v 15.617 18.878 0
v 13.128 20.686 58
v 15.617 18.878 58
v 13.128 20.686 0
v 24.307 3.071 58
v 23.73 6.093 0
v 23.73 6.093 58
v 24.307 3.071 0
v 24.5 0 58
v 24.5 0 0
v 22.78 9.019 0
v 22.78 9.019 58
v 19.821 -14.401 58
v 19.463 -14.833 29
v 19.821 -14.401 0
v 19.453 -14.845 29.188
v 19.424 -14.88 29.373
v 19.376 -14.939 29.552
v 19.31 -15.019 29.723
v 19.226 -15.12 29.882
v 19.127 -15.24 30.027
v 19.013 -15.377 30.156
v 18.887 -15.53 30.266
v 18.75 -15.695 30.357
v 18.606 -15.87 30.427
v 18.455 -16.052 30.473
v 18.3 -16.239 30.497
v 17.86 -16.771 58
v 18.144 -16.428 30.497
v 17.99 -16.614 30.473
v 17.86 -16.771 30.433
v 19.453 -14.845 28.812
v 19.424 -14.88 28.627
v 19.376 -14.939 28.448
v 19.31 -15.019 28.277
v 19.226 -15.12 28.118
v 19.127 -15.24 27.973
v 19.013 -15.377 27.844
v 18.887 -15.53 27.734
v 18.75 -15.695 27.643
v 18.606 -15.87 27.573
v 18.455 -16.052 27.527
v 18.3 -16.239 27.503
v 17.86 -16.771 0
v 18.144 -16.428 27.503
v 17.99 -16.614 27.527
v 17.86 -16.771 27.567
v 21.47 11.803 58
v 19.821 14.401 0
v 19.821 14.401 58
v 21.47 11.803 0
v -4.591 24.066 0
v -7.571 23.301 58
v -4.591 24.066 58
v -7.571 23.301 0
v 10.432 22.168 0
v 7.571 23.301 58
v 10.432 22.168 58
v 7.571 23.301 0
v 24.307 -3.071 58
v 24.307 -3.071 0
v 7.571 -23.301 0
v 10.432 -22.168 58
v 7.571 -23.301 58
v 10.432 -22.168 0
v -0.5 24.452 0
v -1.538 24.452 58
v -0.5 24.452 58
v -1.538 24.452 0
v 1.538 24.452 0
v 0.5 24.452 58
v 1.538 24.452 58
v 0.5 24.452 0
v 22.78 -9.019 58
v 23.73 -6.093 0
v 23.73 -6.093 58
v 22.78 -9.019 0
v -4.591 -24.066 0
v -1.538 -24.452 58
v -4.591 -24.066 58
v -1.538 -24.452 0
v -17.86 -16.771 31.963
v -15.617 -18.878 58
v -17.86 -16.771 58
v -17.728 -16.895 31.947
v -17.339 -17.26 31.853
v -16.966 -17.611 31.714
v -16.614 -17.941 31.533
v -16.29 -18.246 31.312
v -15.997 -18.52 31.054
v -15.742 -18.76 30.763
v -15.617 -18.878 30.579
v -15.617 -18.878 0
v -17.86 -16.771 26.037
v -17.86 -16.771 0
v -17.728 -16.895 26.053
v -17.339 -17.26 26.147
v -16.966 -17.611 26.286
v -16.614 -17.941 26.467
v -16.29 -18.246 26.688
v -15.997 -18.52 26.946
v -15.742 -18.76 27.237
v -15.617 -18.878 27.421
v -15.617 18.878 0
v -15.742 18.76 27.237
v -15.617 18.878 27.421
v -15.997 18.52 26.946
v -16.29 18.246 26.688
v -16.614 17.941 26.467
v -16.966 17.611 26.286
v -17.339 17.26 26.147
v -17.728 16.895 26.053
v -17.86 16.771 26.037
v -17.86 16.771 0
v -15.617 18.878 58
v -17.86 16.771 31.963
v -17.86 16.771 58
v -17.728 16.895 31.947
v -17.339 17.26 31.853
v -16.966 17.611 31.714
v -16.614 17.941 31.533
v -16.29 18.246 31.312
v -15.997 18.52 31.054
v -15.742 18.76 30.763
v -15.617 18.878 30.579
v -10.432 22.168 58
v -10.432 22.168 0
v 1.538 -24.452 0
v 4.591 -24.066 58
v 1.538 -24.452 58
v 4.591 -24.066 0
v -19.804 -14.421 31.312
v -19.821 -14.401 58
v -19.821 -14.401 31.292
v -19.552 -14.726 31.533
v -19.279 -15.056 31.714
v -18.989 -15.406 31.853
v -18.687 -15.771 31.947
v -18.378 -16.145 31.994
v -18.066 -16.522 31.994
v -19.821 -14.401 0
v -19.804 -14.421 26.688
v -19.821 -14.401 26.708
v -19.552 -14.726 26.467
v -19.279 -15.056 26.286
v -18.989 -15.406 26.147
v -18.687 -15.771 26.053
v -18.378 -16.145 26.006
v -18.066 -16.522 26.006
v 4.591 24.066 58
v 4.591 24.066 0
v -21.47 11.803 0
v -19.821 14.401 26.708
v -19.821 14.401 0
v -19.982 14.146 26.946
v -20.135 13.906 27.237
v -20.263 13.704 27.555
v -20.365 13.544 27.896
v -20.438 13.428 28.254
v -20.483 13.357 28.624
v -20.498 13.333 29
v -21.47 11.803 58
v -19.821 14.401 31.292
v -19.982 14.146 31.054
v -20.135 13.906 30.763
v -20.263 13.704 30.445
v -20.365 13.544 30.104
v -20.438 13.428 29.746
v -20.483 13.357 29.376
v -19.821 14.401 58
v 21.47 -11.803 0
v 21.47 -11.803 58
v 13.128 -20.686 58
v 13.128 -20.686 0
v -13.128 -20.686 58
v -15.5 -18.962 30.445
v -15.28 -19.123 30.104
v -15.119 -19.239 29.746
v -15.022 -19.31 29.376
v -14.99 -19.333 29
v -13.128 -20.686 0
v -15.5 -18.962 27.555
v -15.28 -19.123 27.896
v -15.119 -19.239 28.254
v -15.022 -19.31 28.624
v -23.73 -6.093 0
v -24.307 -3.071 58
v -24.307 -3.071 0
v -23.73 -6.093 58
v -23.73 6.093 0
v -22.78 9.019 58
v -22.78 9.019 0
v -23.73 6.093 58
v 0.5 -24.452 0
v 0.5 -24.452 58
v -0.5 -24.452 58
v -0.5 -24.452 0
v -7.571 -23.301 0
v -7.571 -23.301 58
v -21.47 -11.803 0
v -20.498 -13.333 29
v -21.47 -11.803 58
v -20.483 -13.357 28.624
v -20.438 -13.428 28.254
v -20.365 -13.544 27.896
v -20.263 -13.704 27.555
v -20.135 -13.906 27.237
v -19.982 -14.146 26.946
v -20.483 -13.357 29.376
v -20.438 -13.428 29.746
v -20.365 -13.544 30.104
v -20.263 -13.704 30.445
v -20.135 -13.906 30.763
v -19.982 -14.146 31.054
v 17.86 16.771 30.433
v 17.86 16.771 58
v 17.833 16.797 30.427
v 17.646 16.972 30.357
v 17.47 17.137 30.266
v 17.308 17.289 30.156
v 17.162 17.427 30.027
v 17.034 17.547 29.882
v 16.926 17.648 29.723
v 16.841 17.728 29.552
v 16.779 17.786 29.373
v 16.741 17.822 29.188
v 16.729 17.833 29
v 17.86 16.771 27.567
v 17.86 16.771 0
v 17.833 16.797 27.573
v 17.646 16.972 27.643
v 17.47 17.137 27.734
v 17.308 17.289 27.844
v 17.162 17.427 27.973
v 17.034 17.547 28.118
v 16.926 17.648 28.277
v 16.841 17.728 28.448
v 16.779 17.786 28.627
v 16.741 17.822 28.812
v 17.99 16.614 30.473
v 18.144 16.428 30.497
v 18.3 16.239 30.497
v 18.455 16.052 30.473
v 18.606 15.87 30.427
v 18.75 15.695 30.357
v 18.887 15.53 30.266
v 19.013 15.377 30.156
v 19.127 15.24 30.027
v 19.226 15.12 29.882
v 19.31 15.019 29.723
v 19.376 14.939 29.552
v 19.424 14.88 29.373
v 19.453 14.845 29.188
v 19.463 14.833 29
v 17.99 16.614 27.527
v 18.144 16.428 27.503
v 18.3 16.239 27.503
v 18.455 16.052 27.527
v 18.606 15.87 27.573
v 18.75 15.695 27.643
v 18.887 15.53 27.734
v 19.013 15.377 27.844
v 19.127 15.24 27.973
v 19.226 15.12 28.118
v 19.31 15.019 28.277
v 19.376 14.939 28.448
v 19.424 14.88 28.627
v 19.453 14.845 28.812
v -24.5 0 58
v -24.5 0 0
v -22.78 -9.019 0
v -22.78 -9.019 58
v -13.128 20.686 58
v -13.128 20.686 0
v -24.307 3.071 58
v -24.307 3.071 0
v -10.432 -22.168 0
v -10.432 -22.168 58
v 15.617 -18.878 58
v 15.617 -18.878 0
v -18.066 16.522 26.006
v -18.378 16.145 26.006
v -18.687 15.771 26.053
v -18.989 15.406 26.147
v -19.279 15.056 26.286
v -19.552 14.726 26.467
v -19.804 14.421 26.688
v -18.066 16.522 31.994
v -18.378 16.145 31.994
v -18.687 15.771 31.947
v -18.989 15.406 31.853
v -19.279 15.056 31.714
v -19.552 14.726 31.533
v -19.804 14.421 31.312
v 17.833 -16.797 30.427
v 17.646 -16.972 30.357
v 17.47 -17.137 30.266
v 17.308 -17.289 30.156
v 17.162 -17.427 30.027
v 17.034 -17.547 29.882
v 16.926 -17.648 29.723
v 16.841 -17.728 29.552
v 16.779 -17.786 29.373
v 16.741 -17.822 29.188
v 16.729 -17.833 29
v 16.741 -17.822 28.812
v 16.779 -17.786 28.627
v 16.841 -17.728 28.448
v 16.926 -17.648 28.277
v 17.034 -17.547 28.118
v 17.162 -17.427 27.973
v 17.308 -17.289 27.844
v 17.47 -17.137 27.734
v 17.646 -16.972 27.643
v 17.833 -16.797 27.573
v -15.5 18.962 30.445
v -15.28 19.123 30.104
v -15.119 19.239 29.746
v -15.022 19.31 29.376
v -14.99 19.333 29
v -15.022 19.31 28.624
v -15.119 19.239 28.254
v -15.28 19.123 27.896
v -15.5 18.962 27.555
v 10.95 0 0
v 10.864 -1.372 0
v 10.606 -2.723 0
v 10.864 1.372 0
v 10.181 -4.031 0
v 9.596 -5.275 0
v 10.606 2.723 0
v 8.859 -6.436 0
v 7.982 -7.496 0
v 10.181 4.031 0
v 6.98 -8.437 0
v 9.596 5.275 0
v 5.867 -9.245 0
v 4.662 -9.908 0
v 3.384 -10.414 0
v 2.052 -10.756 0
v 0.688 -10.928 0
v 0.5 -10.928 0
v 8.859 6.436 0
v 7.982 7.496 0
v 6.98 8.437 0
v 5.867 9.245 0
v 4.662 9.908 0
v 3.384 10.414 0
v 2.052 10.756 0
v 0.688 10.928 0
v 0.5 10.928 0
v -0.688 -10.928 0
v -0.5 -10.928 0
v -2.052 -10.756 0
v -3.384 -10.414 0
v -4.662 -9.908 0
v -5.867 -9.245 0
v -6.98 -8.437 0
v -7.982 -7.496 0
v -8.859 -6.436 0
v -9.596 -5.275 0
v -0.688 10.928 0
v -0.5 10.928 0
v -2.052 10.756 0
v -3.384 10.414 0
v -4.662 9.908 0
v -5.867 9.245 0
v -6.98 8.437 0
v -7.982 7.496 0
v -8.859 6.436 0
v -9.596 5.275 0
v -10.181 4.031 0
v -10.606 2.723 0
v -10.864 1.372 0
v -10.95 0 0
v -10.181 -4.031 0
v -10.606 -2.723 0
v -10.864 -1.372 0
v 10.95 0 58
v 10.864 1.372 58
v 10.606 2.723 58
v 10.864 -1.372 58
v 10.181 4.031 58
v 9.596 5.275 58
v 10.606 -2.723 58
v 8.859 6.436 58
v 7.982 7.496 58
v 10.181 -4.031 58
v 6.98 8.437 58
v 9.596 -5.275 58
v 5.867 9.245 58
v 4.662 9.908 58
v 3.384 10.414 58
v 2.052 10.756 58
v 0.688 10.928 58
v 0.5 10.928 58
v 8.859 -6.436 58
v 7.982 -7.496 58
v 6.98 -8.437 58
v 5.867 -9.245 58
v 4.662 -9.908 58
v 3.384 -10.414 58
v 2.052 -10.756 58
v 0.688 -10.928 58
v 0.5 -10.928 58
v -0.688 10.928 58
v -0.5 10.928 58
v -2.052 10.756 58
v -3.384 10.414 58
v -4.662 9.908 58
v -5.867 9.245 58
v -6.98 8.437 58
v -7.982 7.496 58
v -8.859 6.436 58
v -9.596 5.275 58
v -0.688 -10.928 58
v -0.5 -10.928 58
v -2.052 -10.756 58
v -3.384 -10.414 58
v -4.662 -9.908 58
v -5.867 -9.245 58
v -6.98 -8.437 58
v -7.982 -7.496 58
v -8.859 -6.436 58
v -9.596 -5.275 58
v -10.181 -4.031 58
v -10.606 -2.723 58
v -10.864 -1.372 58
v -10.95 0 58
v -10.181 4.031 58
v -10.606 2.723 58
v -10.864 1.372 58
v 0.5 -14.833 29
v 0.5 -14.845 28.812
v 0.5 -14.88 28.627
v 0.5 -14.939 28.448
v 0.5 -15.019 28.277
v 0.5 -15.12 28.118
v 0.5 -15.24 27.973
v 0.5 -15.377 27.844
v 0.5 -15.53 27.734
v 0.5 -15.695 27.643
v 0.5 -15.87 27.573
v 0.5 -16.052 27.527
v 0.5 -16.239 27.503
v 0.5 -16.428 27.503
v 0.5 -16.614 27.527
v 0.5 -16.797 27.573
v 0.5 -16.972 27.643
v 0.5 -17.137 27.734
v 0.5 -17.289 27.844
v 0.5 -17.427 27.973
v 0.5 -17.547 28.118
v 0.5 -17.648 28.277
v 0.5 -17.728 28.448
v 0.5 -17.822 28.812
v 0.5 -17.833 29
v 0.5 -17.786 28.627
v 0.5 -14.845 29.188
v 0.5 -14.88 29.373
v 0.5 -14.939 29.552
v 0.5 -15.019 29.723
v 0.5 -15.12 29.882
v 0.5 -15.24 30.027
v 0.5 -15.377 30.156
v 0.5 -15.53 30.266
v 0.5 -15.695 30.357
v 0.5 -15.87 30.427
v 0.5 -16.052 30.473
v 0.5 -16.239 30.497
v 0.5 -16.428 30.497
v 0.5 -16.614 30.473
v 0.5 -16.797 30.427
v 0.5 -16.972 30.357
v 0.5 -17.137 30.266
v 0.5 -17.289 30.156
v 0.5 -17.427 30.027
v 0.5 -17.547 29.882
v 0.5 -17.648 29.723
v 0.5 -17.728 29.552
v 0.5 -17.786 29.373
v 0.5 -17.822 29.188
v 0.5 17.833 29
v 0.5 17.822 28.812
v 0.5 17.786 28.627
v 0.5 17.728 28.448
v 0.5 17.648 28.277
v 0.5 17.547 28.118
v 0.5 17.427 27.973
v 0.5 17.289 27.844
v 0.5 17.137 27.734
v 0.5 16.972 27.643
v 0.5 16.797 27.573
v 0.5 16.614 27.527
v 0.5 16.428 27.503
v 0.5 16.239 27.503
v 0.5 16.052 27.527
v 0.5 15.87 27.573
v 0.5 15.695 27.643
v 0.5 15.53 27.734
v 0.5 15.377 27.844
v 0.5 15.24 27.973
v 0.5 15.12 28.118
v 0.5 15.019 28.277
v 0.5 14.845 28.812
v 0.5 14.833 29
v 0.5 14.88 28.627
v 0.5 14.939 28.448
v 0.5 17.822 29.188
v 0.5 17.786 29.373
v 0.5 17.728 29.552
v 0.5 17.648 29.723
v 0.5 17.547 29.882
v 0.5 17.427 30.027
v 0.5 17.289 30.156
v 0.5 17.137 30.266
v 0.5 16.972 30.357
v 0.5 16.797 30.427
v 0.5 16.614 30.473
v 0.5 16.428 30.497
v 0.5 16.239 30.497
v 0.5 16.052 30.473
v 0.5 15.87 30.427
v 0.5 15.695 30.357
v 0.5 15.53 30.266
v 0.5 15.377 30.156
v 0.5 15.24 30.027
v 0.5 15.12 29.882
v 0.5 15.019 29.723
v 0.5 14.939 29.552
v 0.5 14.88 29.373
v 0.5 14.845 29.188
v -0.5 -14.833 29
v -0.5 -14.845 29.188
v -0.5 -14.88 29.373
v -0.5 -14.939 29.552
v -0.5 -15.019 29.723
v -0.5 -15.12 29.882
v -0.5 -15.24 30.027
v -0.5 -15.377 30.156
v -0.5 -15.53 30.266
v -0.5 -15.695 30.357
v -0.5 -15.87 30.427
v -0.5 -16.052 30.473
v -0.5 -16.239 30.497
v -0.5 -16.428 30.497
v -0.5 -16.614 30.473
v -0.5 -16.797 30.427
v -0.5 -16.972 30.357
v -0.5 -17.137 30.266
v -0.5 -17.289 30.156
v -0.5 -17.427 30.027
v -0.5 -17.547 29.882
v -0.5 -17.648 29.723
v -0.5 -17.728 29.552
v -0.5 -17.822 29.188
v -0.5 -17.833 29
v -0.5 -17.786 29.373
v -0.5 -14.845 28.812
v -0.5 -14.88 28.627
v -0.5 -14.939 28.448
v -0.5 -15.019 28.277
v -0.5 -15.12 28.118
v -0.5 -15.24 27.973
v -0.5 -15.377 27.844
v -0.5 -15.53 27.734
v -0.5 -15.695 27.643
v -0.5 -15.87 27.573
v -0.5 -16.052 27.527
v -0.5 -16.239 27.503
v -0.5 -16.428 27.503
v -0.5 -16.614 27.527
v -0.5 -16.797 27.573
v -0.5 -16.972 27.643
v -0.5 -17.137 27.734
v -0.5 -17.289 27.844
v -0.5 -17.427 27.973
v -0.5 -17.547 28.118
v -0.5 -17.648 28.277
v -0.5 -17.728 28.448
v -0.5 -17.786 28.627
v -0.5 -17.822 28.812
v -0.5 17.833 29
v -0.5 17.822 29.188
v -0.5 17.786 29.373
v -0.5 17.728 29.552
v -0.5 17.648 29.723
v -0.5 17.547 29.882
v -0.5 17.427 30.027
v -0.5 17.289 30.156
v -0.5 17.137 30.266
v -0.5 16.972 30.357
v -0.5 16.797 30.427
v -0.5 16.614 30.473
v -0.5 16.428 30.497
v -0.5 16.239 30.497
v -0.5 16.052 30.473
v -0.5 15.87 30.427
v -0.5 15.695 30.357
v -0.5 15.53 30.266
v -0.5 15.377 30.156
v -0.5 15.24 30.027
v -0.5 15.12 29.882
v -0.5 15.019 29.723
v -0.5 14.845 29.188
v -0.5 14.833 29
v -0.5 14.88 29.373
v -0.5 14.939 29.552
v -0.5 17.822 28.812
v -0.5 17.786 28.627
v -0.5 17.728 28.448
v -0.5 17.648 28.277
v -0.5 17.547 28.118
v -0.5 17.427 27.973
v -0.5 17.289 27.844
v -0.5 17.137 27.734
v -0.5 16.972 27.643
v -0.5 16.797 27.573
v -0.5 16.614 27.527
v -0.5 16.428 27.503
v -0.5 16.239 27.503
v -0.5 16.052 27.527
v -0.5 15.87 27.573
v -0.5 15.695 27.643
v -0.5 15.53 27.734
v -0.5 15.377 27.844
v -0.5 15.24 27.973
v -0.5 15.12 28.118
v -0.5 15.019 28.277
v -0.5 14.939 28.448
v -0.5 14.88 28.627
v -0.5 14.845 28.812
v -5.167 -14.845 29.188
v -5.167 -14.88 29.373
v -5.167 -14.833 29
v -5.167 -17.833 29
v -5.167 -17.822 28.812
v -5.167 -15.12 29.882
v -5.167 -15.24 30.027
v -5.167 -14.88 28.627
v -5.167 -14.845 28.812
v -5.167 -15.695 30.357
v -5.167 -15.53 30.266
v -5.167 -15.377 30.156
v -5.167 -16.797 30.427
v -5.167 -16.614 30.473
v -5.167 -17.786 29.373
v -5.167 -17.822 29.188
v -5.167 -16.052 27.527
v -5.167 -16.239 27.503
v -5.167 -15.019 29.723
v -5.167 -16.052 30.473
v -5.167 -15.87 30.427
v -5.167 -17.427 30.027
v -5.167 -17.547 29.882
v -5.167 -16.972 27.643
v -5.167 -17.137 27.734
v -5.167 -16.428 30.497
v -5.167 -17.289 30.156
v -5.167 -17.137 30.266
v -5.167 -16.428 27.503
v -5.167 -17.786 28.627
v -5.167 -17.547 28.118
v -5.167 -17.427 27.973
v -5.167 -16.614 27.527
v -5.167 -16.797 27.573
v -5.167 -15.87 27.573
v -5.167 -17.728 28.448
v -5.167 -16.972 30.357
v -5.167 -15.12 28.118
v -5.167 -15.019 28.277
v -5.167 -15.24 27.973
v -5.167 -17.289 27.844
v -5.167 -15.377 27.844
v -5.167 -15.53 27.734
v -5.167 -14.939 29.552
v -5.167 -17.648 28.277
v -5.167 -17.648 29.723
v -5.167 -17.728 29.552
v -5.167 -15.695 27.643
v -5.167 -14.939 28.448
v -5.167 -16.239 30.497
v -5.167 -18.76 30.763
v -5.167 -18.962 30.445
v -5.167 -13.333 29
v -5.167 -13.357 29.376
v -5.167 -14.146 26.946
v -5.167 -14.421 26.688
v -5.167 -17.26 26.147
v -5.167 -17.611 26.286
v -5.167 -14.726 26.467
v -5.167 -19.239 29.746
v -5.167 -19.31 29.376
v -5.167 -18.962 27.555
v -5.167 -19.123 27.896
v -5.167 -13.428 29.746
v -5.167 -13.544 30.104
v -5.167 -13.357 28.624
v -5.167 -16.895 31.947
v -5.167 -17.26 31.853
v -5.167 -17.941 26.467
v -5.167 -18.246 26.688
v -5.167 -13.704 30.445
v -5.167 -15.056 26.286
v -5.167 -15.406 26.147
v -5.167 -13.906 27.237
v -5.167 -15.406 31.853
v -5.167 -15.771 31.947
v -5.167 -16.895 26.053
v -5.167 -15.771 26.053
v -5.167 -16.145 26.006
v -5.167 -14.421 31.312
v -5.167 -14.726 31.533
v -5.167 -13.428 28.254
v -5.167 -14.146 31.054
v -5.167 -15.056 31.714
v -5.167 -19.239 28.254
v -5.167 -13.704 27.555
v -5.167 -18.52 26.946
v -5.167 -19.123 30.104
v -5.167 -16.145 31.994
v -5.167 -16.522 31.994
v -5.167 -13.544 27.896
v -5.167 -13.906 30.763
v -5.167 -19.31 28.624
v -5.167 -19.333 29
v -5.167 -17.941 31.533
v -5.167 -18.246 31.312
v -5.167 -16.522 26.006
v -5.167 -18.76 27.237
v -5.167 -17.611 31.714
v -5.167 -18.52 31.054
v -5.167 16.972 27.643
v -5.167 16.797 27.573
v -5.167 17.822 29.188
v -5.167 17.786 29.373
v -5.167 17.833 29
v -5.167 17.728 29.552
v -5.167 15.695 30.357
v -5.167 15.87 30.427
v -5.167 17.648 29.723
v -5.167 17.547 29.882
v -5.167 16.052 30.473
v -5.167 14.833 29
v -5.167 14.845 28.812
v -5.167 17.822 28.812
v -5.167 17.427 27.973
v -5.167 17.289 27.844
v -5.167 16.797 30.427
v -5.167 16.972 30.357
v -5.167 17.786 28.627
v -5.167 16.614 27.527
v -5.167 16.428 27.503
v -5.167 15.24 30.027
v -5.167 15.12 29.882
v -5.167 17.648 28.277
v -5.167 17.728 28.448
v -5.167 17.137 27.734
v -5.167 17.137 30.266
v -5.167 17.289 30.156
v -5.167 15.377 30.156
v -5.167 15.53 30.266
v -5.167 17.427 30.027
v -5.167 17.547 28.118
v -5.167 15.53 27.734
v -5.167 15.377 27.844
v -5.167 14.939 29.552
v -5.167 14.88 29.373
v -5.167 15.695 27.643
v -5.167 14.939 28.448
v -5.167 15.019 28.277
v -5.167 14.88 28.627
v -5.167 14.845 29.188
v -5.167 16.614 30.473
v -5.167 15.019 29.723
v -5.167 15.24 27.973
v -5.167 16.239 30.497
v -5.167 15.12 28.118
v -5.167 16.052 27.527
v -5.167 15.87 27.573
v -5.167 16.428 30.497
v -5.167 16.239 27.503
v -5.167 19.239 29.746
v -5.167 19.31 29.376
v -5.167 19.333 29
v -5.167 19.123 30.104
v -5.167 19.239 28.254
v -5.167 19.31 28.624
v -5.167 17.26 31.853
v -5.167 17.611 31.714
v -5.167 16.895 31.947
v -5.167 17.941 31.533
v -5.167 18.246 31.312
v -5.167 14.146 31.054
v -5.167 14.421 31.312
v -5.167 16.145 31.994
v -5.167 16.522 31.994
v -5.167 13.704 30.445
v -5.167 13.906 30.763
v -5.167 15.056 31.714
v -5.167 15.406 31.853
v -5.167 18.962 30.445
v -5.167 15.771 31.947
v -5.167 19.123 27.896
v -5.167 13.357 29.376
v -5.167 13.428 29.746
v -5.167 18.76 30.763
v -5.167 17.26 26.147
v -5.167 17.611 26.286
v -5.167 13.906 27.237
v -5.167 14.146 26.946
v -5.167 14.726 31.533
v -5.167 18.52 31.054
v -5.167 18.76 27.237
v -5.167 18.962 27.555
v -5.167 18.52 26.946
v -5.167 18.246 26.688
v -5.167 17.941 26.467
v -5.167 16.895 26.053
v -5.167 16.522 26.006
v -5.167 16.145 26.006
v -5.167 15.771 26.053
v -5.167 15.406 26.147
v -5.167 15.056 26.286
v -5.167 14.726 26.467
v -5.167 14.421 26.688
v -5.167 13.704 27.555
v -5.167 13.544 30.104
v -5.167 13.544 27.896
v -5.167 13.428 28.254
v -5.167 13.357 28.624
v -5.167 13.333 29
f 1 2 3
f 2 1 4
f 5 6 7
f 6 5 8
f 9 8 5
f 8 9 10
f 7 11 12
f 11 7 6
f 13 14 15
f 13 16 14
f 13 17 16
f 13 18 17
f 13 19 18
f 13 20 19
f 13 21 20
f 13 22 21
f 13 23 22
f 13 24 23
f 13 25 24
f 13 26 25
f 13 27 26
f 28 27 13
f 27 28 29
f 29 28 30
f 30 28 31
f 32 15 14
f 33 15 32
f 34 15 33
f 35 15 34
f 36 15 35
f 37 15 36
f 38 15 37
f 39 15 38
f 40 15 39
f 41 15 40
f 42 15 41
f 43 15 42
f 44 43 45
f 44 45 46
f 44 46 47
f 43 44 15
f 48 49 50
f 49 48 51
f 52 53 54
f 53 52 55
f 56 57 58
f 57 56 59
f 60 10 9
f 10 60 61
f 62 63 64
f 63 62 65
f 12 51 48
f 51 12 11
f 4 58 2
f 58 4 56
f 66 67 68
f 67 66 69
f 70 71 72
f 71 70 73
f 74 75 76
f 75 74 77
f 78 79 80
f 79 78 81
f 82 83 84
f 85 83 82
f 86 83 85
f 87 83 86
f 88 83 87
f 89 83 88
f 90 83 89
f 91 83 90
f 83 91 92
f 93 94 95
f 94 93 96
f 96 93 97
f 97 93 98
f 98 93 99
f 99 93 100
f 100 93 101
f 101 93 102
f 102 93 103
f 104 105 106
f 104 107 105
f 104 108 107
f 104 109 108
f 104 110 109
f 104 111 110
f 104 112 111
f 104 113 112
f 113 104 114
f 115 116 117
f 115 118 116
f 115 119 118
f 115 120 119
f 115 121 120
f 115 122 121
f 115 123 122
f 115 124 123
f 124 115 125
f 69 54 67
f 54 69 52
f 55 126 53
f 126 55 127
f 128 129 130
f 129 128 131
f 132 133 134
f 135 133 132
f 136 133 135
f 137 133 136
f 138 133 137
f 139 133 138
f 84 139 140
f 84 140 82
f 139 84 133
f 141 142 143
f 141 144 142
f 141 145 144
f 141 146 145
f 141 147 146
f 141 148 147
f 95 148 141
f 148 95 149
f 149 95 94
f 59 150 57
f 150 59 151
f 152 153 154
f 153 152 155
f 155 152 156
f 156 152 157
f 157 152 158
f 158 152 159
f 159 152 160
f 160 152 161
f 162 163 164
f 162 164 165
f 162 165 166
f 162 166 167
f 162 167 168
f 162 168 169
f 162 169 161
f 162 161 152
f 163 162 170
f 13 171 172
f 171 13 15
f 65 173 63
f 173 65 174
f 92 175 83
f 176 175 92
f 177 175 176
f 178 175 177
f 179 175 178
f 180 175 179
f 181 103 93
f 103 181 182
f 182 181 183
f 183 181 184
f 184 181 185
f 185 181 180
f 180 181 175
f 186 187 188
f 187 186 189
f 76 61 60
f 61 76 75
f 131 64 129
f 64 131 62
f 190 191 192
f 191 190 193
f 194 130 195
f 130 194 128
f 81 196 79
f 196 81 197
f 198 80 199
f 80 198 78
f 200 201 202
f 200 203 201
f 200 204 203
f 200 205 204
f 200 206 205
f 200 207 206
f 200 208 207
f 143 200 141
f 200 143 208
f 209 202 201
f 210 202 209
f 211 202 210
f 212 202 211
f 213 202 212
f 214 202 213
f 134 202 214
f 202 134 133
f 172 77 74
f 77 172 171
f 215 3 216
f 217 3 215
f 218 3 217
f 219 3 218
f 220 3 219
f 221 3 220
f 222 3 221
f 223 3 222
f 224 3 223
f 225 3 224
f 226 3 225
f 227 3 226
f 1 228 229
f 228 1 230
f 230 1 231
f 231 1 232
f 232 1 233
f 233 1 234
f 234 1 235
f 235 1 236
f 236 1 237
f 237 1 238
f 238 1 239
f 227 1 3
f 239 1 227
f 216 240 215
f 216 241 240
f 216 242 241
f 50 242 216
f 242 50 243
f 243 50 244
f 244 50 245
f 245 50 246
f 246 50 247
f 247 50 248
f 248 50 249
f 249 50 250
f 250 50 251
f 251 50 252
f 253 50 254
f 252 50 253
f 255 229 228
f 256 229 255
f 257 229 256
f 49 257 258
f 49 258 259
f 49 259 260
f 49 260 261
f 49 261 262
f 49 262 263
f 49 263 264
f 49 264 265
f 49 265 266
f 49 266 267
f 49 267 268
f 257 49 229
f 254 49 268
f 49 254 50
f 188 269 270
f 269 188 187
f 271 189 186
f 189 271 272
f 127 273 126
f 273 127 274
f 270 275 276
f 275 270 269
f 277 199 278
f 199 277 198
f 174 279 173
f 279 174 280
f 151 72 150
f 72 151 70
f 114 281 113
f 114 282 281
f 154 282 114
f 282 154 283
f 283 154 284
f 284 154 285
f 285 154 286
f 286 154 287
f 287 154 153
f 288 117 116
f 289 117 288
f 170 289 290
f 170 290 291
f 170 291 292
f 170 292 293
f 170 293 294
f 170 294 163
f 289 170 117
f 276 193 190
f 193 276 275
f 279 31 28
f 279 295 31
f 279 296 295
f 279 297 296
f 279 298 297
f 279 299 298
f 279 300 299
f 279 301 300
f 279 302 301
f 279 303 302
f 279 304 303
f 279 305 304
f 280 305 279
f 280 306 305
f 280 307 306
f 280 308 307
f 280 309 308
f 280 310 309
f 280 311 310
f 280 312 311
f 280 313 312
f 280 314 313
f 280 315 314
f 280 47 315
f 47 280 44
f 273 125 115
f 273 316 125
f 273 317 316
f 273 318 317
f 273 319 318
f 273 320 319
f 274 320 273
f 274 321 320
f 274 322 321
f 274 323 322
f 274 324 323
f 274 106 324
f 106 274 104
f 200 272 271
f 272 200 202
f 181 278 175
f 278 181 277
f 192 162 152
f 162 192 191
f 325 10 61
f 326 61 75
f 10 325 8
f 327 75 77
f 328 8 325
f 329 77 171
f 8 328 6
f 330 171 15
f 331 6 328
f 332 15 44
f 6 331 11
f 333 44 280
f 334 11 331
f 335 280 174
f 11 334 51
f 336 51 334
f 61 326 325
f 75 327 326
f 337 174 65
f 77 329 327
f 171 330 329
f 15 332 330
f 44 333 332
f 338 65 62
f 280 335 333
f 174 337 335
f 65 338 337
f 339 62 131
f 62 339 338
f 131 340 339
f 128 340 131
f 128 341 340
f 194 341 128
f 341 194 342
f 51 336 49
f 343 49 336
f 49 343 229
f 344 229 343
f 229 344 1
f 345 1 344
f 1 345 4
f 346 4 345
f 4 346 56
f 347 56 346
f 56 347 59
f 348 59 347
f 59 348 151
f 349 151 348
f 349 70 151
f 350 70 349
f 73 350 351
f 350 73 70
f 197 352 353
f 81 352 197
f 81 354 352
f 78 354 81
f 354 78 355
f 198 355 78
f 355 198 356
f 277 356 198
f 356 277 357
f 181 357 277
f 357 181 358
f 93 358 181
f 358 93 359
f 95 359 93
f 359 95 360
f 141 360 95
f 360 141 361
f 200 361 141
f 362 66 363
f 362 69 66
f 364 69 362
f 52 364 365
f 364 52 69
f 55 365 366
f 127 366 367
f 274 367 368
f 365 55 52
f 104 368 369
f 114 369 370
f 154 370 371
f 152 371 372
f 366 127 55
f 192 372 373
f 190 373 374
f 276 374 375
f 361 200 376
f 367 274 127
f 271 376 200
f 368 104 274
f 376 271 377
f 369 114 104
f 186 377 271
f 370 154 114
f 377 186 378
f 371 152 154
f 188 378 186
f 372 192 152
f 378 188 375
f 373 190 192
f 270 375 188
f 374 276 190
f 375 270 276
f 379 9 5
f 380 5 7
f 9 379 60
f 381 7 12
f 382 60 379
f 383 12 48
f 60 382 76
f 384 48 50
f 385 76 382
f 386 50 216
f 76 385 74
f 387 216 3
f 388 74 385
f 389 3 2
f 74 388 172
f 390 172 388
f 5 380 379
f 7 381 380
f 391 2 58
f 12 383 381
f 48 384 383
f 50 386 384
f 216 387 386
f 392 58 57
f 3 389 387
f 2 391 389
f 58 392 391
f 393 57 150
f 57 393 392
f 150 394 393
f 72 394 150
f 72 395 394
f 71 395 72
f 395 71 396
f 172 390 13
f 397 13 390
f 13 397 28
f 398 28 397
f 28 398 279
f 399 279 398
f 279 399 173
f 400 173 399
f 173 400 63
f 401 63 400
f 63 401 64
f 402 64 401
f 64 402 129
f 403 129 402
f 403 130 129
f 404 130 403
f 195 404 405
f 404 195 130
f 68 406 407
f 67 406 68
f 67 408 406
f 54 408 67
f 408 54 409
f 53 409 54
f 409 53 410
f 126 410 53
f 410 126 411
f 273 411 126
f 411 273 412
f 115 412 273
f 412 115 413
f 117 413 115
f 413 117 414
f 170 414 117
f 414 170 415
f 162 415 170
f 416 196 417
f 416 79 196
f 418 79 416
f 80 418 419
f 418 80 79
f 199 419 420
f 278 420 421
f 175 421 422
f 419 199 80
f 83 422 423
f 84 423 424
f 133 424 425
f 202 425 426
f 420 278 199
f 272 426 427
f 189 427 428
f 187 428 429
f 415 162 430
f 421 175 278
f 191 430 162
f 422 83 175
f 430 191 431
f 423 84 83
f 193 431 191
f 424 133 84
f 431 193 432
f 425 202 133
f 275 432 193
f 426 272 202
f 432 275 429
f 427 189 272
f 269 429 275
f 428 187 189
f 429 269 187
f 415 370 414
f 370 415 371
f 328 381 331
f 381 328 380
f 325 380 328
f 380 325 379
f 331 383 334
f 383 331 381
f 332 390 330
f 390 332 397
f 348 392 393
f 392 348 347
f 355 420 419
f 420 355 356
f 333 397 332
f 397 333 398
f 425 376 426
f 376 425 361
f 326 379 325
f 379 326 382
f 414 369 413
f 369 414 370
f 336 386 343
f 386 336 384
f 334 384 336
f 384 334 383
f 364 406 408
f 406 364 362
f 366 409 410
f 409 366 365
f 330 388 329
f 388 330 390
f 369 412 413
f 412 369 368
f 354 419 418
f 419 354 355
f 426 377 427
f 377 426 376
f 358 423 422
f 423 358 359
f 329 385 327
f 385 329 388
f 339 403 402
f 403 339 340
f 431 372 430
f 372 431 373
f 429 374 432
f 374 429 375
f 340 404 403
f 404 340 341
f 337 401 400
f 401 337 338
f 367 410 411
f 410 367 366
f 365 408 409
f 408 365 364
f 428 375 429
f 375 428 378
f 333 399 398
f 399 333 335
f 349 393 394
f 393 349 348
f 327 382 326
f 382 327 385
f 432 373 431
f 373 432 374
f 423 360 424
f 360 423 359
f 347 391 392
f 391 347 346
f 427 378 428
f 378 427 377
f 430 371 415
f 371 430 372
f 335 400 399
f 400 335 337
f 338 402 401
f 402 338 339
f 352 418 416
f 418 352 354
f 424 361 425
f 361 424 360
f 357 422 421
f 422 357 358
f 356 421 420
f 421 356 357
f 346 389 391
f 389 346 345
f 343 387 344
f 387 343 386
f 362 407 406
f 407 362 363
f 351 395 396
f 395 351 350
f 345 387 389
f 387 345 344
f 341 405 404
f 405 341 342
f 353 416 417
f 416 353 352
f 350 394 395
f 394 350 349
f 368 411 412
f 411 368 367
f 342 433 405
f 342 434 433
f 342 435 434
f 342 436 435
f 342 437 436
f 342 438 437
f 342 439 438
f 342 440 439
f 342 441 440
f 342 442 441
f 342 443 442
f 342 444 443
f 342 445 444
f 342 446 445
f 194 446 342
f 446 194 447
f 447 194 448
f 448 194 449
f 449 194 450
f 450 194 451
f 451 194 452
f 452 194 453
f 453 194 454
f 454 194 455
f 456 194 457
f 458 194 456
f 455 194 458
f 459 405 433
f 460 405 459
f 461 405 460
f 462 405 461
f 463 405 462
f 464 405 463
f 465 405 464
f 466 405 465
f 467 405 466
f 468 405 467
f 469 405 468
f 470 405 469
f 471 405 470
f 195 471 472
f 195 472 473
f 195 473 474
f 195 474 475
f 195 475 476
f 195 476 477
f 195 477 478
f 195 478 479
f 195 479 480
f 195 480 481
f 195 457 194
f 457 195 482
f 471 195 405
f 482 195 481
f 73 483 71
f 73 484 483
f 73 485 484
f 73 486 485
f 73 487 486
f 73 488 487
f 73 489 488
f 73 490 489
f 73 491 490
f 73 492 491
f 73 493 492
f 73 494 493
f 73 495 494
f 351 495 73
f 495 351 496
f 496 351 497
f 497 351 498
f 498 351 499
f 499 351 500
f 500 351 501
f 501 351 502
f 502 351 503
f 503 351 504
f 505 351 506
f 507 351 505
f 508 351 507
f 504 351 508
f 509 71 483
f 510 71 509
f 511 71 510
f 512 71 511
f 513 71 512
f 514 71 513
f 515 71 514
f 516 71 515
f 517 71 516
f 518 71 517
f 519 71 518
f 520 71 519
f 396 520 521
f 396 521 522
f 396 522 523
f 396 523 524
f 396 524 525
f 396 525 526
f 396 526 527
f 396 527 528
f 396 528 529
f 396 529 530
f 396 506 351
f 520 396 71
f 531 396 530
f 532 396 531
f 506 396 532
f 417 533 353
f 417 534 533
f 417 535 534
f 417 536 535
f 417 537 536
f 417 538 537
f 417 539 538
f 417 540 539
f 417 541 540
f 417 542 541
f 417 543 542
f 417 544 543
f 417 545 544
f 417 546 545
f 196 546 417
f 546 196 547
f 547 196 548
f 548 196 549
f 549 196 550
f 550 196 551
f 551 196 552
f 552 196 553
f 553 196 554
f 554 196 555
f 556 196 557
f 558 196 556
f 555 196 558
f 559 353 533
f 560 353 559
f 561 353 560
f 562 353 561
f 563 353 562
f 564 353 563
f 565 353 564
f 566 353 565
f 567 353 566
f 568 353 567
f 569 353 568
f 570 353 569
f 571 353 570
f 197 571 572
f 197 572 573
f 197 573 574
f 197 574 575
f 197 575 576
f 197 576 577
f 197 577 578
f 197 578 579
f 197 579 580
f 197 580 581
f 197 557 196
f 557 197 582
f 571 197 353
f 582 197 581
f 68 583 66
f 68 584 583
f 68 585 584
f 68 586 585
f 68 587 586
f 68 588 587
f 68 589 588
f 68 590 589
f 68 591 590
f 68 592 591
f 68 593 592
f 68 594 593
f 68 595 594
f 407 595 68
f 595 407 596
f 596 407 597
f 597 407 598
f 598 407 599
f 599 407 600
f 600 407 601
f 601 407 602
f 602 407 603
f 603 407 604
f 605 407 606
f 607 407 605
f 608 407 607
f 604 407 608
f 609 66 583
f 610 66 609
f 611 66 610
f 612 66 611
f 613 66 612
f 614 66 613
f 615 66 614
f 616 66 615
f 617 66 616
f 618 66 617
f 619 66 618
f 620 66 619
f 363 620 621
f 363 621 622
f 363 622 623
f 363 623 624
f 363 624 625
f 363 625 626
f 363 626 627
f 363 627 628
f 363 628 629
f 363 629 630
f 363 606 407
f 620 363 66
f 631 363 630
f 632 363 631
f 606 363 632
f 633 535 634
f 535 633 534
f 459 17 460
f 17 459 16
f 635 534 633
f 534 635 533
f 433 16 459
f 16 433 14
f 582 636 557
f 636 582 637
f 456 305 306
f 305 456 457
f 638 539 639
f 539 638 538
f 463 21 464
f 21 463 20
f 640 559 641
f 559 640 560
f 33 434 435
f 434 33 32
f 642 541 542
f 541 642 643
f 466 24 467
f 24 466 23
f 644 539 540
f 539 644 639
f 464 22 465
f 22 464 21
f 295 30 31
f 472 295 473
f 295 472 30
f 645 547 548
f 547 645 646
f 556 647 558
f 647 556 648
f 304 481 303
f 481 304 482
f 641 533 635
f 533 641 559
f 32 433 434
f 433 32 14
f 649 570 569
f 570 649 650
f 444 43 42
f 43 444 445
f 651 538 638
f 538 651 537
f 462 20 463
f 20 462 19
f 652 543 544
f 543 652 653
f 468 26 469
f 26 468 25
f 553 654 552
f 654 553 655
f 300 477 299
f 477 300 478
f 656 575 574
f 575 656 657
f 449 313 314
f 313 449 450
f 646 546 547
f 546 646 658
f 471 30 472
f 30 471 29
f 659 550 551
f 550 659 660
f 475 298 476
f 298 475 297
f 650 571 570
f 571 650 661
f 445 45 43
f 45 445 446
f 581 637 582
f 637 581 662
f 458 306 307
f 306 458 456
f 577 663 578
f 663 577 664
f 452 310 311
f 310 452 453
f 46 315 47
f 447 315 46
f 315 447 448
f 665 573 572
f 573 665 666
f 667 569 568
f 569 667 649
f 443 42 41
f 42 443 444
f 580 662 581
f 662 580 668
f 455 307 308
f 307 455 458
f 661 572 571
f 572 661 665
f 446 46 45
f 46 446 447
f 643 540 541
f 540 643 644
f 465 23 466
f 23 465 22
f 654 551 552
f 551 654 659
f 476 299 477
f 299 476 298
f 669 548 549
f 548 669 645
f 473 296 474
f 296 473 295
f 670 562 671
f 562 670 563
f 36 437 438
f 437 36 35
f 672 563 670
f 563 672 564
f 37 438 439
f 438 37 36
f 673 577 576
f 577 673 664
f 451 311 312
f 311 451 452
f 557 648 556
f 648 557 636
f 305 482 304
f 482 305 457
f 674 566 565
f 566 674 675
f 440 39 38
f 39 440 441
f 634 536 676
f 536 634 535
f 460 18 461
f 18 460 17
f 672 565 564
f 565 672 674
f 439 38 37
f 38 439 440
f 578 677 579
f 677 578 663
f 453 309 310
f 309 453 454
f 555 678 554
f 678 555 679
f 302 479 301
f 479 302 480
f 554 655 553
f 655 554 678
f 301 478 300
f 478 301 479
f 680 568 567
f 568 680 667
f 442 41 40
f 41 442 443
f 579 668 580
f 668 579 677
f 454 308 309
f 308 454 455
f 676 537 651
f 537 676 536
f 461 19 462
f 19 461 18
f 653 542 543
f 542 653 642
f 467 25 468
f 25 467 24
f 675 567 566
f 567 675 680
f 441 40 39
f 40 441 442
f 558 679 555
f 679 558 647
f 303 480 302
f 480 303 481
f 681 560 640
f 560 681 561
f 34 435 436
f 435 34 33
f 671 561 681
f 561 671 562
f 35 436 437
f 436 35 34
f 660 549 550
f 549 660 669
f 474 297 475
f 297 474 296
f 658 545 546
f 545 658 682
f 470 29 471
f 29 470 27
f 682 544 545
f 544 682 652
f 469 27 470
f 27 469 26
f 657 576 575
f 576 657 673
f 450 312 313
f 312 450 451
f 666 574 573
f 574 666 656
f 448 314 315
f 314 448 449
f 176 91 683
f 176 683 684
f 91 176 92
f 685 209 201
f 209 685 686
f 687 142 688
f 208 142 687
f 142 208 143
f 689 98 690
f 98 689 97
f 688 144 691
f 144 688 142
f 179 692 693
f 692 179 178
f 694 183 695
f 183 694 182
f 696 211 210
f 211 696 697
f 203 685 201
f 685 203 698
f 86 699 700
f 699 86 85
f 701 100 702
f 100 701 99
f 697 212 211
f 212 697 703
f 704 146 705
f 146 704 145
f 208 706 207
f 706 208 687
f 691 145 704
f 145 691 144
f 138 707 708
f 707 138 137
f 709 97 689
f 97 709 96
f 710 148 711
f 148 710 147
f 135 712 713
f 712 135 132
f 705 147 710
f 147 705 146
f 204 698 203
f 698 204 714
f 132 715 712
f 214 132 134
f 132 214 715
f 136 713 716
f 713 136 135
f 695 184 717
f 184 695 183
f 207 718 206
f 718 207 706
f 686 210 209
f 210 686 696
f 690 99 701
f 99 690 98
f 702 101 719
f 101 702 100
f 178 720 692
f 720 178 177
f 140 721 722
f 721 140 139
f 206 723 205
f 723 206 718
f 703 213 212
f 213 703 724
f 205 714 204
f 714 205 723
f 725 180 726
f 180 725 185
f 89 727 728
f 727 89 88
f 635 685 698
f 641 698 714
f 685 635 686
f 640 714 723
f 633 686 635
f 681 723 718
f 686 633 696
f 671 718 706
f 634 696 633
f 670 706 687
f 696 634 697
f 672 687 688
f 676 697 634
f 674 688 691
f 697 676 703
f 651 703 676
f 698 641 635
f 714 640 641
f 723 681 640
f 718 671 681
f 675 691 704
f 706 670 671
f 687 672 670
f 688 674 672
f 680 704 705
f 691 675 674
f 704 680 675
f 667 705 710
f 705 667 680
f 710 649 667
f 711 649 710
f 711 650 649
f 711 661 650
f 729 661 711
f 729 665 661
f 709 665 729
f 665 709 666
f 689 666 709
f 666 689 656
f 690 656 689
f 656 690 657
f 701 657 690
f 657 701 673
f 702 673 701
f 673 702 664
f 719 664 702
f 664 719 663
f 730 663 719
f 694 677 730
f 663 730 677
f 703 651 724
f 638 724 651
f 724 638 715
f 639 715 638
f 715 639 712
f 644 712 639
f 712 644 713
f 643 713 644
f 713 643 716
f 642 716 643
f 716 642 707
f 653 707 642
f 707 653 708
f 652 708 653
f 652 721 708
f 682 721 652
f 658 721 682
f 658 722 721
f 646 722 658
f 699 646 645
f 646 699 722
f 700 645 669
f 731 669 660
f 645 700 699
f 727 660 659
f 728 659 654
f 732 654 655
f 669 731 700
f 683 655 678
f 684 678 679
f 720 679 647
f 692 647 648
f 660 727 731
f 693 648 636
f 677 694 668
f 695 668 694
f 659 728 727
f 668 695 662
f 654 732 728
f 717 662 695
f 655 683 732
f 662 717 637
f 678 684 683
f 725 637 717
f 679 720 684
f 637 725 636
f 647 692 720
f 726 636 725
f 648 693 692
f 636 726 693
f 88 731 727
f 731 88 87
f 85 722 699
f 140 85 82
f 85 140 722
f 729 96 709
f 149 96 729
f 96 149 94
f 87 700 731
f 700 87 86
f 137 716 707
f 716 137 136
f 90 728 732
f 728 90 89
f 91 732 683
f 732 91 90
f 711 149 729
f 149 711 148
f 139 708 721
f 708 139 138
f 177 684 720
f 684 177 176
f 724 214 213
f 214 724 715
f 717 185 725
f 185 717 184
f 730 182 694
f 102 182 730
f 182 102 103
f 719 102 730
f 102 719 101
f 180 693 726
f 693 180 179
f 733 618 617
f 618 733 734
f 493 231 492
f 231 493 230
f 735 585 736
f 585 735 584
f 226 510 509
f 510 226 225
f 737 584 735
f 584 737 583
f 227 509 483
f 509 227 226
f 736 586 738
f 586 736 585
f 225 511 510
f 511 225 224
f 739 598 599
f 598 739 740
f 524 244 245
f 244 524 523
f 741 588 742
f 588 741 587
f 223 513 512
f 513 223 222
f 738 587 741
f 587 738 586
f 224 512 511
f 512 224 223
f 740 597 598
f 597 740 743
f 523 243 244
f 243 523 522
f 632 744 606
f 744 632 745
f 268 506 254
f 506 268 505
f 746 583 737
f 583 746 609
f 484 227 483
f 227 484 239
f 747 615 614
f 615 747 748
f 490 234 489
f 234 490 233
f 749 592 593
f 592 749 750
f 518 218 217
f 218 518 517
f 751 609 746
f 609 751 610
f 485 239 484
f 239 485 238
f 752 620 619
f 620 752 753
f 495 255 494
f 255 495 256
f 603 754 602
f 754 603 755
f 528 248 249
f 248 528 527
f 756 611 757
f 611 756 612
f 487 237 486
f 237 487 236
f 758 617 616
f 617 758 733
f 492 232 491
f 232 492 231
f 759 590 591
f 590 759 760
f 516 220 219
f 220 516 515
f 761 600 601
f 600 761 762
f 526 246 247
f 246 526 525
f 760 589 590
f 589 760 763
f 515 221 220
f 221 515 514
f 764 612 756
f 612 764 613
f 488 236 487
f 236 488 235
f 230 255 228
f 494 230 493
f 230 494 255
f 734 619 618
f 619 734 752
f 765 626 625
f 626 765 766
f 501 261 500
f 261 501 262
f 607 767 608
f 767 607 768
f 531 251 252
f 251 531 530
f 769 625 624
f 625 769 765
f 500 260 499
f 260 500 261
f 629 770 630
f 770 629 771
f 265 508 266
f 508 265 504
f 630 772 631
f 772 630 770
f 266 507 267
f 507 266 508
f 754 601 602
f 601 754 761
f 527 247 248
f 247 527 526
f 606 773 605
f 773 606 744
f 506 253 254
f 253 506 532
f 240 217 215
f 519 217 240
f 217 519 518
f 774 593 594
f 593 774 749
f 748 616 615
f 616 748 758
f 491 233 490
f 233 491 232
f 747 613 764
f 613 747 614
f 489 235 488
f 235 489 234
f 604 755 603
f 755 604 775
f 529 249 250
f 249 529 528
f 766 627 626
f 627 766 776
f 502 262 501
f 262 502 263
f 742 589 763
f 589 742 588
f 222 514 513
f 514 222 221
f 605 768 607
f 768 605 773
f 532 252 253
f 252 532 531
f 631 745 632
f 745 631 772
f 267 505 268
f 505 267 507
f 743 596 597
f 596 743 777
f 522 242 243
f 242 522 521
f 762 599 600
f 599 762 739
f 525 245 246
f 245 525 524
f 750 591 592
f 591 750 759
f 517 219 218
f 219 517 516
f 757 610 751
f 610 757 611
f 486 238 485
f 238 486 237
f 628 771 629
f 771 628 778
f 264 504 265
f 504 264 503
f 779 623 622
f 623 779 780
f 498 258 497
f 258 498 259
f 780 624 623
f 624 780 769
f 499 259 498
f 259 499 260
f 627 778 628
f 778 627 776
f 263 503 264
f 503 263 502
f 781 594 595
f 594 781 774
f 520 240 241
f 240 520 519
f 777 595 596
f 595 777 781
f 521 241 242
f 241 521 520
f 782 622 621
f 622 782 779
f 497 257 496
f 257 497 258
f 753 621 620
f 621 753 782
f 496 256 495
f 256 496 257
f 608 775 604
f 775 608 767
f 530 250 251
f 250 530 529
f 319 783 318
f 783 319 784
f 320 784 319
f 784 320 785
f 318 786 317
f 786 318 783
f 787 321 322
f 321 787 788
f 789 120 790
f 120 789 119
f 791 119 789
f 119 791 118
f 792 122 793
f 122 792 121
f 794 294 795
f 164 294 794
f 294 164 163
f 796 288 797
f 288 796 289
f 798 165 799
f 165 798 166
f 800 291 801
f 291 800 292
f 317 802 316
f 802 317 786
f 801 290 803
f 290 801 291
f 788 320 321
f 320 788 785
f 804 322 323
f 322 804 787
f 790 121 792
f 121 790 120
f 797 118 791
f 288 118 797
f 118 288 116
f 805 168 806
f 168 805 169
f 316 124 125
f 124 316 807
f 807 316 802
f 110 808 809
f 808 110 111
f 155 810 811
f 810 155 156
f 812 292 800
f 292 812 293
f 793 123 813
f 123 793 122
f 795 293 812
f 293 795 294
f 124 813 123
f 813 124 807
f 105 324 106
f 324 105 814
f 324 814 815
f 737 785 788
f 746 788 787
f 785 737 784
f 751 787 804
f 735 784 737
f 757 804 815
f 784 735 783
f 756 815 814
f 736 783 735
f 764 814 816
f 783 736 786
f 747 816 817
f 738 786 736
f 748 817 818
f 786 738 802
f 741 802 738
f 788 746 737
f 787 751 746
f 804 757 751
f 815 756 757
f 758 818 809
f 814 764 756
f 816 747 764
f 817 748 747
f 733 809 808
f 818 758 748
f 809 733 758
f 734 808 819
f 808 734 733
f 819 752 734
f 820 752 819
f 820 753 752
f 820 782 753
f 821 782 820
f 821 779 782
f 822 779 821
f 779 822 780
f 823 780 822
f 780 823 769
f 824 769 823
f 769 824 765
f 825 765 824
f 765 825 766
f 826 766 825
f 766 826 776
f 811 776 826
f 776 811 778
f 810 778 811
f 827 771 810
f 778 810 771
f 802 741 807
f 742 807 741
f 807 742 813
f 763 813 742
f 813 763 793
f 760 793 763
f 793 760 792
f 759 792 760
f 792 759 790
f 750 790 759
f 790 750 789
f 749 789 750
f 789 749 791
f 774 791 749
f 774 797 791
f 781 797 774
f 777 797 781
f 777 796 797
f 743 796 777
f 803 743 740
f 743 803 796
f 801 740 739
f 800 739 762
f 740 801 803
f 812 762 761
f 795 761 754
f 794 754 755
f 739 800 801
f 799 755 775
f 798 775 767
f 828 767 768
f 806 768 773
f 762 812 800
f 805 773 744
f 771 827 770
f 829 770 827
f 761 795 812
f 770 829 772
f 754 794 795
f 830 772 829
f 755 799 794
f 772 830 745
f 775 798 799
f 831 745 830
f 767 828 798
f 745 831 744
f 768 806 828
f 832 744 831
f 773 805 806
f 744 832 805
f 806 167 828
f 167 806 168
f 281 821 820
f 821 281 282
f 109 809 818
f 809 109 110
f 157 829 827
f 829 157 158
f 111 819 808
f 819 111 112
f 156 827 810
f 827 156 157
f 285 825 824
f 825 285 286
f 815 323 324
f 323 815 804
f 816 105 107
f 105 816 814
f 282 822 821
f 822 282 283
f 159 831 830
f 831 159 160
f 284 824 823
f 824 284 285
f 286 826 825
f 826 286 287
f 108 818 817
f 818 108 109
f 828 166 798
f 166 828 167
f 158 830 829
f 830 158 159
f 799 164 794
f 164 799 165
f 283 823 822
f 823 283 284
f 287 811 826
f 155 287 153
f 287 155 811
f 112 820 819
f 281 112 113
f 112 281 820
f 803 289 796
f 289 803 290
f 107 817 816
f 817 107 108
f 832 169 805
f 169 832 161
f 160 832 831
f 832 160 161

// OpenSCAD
/******************************************************************************/
/**********                     INFO                                 **********/
/******************************************************************************/
/*
Tripod Antenna Mount Spacer 1.0 May 2016
by David Buhler
Used to mount amatuer radio antennas with a post mount u-bracket to a tripod. 
I used an old camera tripod that works perfectly for this.

Attribution-NonCommercial 3.0 (CC BY-NC 3.0)
http://creativecommons.org/licenses/by-nc/3.0/
*/
/******************************************************************************/
/**********                     Settings                             **********/
/******************************************************************************/
//adjust the follow to meet your needs,  all measurements in mm.

/* [Spacer Sizing] */
//Top Tripod Ring Diameter
outer_ring=49;//[5:100] 
//Tripod Post Diameter
tripod_post=21.9;//[5:100]
//Height of the Spacer
mount_height=58;//[5:100]
//Screw Thread Diameter
screw_diameter=3;//[1:7]
//Screw Head Diameter
screw_head_dia=6;//[2:15]

/******************************************************************************/
/**********                   Variable Calcs                         **********/
/****                     no need to adjust these                      ********/
/******************************************************************************/
/* [HIDDEN] */

/******************************************************************************/
/**********                  Make It Happen Stuff                    **********/
/******************************************************************************/
$fn=50;
difference (){
cylinder(d=outer_ring,h=mount_height);
cylinder(d=tripod_post,h=mount_height);//post hole
translate ([-0.5,-outer_ring/2-0.01,-.01]) 
   cube([1,outer_ring+2,mount_height+2]);
translate ([-outer_ring/2,-outer_ring/3,mount_height/2])rotate([90,0,90]) 
   screw_hole();
translate ([-outer_ring/2+screw_head_dia-3,-outer_ring/3,mount_height/2])rotate([90,0,90]) 
   screw_head();
translate ([-outer_ring/2,outer_ring/3,mount_height/2])rotate([90,0,90]) 
   screw_hole();
translate ([-outer_ring/2+screw_head_dia-3,outer_ring/3,mount_height/2])rotate([90,0,90]) 
   screw_head();
}
/******************************************************************************/
/**********                         Modules                          **********/
/******************************************************************************/
module screw_hole(){
     cylinder(d=screw_diameter,h=outer_ring); 
}
module screw_head(){
    cylinder(d=screw_head_dia,h=outer_ring/3); 
}
